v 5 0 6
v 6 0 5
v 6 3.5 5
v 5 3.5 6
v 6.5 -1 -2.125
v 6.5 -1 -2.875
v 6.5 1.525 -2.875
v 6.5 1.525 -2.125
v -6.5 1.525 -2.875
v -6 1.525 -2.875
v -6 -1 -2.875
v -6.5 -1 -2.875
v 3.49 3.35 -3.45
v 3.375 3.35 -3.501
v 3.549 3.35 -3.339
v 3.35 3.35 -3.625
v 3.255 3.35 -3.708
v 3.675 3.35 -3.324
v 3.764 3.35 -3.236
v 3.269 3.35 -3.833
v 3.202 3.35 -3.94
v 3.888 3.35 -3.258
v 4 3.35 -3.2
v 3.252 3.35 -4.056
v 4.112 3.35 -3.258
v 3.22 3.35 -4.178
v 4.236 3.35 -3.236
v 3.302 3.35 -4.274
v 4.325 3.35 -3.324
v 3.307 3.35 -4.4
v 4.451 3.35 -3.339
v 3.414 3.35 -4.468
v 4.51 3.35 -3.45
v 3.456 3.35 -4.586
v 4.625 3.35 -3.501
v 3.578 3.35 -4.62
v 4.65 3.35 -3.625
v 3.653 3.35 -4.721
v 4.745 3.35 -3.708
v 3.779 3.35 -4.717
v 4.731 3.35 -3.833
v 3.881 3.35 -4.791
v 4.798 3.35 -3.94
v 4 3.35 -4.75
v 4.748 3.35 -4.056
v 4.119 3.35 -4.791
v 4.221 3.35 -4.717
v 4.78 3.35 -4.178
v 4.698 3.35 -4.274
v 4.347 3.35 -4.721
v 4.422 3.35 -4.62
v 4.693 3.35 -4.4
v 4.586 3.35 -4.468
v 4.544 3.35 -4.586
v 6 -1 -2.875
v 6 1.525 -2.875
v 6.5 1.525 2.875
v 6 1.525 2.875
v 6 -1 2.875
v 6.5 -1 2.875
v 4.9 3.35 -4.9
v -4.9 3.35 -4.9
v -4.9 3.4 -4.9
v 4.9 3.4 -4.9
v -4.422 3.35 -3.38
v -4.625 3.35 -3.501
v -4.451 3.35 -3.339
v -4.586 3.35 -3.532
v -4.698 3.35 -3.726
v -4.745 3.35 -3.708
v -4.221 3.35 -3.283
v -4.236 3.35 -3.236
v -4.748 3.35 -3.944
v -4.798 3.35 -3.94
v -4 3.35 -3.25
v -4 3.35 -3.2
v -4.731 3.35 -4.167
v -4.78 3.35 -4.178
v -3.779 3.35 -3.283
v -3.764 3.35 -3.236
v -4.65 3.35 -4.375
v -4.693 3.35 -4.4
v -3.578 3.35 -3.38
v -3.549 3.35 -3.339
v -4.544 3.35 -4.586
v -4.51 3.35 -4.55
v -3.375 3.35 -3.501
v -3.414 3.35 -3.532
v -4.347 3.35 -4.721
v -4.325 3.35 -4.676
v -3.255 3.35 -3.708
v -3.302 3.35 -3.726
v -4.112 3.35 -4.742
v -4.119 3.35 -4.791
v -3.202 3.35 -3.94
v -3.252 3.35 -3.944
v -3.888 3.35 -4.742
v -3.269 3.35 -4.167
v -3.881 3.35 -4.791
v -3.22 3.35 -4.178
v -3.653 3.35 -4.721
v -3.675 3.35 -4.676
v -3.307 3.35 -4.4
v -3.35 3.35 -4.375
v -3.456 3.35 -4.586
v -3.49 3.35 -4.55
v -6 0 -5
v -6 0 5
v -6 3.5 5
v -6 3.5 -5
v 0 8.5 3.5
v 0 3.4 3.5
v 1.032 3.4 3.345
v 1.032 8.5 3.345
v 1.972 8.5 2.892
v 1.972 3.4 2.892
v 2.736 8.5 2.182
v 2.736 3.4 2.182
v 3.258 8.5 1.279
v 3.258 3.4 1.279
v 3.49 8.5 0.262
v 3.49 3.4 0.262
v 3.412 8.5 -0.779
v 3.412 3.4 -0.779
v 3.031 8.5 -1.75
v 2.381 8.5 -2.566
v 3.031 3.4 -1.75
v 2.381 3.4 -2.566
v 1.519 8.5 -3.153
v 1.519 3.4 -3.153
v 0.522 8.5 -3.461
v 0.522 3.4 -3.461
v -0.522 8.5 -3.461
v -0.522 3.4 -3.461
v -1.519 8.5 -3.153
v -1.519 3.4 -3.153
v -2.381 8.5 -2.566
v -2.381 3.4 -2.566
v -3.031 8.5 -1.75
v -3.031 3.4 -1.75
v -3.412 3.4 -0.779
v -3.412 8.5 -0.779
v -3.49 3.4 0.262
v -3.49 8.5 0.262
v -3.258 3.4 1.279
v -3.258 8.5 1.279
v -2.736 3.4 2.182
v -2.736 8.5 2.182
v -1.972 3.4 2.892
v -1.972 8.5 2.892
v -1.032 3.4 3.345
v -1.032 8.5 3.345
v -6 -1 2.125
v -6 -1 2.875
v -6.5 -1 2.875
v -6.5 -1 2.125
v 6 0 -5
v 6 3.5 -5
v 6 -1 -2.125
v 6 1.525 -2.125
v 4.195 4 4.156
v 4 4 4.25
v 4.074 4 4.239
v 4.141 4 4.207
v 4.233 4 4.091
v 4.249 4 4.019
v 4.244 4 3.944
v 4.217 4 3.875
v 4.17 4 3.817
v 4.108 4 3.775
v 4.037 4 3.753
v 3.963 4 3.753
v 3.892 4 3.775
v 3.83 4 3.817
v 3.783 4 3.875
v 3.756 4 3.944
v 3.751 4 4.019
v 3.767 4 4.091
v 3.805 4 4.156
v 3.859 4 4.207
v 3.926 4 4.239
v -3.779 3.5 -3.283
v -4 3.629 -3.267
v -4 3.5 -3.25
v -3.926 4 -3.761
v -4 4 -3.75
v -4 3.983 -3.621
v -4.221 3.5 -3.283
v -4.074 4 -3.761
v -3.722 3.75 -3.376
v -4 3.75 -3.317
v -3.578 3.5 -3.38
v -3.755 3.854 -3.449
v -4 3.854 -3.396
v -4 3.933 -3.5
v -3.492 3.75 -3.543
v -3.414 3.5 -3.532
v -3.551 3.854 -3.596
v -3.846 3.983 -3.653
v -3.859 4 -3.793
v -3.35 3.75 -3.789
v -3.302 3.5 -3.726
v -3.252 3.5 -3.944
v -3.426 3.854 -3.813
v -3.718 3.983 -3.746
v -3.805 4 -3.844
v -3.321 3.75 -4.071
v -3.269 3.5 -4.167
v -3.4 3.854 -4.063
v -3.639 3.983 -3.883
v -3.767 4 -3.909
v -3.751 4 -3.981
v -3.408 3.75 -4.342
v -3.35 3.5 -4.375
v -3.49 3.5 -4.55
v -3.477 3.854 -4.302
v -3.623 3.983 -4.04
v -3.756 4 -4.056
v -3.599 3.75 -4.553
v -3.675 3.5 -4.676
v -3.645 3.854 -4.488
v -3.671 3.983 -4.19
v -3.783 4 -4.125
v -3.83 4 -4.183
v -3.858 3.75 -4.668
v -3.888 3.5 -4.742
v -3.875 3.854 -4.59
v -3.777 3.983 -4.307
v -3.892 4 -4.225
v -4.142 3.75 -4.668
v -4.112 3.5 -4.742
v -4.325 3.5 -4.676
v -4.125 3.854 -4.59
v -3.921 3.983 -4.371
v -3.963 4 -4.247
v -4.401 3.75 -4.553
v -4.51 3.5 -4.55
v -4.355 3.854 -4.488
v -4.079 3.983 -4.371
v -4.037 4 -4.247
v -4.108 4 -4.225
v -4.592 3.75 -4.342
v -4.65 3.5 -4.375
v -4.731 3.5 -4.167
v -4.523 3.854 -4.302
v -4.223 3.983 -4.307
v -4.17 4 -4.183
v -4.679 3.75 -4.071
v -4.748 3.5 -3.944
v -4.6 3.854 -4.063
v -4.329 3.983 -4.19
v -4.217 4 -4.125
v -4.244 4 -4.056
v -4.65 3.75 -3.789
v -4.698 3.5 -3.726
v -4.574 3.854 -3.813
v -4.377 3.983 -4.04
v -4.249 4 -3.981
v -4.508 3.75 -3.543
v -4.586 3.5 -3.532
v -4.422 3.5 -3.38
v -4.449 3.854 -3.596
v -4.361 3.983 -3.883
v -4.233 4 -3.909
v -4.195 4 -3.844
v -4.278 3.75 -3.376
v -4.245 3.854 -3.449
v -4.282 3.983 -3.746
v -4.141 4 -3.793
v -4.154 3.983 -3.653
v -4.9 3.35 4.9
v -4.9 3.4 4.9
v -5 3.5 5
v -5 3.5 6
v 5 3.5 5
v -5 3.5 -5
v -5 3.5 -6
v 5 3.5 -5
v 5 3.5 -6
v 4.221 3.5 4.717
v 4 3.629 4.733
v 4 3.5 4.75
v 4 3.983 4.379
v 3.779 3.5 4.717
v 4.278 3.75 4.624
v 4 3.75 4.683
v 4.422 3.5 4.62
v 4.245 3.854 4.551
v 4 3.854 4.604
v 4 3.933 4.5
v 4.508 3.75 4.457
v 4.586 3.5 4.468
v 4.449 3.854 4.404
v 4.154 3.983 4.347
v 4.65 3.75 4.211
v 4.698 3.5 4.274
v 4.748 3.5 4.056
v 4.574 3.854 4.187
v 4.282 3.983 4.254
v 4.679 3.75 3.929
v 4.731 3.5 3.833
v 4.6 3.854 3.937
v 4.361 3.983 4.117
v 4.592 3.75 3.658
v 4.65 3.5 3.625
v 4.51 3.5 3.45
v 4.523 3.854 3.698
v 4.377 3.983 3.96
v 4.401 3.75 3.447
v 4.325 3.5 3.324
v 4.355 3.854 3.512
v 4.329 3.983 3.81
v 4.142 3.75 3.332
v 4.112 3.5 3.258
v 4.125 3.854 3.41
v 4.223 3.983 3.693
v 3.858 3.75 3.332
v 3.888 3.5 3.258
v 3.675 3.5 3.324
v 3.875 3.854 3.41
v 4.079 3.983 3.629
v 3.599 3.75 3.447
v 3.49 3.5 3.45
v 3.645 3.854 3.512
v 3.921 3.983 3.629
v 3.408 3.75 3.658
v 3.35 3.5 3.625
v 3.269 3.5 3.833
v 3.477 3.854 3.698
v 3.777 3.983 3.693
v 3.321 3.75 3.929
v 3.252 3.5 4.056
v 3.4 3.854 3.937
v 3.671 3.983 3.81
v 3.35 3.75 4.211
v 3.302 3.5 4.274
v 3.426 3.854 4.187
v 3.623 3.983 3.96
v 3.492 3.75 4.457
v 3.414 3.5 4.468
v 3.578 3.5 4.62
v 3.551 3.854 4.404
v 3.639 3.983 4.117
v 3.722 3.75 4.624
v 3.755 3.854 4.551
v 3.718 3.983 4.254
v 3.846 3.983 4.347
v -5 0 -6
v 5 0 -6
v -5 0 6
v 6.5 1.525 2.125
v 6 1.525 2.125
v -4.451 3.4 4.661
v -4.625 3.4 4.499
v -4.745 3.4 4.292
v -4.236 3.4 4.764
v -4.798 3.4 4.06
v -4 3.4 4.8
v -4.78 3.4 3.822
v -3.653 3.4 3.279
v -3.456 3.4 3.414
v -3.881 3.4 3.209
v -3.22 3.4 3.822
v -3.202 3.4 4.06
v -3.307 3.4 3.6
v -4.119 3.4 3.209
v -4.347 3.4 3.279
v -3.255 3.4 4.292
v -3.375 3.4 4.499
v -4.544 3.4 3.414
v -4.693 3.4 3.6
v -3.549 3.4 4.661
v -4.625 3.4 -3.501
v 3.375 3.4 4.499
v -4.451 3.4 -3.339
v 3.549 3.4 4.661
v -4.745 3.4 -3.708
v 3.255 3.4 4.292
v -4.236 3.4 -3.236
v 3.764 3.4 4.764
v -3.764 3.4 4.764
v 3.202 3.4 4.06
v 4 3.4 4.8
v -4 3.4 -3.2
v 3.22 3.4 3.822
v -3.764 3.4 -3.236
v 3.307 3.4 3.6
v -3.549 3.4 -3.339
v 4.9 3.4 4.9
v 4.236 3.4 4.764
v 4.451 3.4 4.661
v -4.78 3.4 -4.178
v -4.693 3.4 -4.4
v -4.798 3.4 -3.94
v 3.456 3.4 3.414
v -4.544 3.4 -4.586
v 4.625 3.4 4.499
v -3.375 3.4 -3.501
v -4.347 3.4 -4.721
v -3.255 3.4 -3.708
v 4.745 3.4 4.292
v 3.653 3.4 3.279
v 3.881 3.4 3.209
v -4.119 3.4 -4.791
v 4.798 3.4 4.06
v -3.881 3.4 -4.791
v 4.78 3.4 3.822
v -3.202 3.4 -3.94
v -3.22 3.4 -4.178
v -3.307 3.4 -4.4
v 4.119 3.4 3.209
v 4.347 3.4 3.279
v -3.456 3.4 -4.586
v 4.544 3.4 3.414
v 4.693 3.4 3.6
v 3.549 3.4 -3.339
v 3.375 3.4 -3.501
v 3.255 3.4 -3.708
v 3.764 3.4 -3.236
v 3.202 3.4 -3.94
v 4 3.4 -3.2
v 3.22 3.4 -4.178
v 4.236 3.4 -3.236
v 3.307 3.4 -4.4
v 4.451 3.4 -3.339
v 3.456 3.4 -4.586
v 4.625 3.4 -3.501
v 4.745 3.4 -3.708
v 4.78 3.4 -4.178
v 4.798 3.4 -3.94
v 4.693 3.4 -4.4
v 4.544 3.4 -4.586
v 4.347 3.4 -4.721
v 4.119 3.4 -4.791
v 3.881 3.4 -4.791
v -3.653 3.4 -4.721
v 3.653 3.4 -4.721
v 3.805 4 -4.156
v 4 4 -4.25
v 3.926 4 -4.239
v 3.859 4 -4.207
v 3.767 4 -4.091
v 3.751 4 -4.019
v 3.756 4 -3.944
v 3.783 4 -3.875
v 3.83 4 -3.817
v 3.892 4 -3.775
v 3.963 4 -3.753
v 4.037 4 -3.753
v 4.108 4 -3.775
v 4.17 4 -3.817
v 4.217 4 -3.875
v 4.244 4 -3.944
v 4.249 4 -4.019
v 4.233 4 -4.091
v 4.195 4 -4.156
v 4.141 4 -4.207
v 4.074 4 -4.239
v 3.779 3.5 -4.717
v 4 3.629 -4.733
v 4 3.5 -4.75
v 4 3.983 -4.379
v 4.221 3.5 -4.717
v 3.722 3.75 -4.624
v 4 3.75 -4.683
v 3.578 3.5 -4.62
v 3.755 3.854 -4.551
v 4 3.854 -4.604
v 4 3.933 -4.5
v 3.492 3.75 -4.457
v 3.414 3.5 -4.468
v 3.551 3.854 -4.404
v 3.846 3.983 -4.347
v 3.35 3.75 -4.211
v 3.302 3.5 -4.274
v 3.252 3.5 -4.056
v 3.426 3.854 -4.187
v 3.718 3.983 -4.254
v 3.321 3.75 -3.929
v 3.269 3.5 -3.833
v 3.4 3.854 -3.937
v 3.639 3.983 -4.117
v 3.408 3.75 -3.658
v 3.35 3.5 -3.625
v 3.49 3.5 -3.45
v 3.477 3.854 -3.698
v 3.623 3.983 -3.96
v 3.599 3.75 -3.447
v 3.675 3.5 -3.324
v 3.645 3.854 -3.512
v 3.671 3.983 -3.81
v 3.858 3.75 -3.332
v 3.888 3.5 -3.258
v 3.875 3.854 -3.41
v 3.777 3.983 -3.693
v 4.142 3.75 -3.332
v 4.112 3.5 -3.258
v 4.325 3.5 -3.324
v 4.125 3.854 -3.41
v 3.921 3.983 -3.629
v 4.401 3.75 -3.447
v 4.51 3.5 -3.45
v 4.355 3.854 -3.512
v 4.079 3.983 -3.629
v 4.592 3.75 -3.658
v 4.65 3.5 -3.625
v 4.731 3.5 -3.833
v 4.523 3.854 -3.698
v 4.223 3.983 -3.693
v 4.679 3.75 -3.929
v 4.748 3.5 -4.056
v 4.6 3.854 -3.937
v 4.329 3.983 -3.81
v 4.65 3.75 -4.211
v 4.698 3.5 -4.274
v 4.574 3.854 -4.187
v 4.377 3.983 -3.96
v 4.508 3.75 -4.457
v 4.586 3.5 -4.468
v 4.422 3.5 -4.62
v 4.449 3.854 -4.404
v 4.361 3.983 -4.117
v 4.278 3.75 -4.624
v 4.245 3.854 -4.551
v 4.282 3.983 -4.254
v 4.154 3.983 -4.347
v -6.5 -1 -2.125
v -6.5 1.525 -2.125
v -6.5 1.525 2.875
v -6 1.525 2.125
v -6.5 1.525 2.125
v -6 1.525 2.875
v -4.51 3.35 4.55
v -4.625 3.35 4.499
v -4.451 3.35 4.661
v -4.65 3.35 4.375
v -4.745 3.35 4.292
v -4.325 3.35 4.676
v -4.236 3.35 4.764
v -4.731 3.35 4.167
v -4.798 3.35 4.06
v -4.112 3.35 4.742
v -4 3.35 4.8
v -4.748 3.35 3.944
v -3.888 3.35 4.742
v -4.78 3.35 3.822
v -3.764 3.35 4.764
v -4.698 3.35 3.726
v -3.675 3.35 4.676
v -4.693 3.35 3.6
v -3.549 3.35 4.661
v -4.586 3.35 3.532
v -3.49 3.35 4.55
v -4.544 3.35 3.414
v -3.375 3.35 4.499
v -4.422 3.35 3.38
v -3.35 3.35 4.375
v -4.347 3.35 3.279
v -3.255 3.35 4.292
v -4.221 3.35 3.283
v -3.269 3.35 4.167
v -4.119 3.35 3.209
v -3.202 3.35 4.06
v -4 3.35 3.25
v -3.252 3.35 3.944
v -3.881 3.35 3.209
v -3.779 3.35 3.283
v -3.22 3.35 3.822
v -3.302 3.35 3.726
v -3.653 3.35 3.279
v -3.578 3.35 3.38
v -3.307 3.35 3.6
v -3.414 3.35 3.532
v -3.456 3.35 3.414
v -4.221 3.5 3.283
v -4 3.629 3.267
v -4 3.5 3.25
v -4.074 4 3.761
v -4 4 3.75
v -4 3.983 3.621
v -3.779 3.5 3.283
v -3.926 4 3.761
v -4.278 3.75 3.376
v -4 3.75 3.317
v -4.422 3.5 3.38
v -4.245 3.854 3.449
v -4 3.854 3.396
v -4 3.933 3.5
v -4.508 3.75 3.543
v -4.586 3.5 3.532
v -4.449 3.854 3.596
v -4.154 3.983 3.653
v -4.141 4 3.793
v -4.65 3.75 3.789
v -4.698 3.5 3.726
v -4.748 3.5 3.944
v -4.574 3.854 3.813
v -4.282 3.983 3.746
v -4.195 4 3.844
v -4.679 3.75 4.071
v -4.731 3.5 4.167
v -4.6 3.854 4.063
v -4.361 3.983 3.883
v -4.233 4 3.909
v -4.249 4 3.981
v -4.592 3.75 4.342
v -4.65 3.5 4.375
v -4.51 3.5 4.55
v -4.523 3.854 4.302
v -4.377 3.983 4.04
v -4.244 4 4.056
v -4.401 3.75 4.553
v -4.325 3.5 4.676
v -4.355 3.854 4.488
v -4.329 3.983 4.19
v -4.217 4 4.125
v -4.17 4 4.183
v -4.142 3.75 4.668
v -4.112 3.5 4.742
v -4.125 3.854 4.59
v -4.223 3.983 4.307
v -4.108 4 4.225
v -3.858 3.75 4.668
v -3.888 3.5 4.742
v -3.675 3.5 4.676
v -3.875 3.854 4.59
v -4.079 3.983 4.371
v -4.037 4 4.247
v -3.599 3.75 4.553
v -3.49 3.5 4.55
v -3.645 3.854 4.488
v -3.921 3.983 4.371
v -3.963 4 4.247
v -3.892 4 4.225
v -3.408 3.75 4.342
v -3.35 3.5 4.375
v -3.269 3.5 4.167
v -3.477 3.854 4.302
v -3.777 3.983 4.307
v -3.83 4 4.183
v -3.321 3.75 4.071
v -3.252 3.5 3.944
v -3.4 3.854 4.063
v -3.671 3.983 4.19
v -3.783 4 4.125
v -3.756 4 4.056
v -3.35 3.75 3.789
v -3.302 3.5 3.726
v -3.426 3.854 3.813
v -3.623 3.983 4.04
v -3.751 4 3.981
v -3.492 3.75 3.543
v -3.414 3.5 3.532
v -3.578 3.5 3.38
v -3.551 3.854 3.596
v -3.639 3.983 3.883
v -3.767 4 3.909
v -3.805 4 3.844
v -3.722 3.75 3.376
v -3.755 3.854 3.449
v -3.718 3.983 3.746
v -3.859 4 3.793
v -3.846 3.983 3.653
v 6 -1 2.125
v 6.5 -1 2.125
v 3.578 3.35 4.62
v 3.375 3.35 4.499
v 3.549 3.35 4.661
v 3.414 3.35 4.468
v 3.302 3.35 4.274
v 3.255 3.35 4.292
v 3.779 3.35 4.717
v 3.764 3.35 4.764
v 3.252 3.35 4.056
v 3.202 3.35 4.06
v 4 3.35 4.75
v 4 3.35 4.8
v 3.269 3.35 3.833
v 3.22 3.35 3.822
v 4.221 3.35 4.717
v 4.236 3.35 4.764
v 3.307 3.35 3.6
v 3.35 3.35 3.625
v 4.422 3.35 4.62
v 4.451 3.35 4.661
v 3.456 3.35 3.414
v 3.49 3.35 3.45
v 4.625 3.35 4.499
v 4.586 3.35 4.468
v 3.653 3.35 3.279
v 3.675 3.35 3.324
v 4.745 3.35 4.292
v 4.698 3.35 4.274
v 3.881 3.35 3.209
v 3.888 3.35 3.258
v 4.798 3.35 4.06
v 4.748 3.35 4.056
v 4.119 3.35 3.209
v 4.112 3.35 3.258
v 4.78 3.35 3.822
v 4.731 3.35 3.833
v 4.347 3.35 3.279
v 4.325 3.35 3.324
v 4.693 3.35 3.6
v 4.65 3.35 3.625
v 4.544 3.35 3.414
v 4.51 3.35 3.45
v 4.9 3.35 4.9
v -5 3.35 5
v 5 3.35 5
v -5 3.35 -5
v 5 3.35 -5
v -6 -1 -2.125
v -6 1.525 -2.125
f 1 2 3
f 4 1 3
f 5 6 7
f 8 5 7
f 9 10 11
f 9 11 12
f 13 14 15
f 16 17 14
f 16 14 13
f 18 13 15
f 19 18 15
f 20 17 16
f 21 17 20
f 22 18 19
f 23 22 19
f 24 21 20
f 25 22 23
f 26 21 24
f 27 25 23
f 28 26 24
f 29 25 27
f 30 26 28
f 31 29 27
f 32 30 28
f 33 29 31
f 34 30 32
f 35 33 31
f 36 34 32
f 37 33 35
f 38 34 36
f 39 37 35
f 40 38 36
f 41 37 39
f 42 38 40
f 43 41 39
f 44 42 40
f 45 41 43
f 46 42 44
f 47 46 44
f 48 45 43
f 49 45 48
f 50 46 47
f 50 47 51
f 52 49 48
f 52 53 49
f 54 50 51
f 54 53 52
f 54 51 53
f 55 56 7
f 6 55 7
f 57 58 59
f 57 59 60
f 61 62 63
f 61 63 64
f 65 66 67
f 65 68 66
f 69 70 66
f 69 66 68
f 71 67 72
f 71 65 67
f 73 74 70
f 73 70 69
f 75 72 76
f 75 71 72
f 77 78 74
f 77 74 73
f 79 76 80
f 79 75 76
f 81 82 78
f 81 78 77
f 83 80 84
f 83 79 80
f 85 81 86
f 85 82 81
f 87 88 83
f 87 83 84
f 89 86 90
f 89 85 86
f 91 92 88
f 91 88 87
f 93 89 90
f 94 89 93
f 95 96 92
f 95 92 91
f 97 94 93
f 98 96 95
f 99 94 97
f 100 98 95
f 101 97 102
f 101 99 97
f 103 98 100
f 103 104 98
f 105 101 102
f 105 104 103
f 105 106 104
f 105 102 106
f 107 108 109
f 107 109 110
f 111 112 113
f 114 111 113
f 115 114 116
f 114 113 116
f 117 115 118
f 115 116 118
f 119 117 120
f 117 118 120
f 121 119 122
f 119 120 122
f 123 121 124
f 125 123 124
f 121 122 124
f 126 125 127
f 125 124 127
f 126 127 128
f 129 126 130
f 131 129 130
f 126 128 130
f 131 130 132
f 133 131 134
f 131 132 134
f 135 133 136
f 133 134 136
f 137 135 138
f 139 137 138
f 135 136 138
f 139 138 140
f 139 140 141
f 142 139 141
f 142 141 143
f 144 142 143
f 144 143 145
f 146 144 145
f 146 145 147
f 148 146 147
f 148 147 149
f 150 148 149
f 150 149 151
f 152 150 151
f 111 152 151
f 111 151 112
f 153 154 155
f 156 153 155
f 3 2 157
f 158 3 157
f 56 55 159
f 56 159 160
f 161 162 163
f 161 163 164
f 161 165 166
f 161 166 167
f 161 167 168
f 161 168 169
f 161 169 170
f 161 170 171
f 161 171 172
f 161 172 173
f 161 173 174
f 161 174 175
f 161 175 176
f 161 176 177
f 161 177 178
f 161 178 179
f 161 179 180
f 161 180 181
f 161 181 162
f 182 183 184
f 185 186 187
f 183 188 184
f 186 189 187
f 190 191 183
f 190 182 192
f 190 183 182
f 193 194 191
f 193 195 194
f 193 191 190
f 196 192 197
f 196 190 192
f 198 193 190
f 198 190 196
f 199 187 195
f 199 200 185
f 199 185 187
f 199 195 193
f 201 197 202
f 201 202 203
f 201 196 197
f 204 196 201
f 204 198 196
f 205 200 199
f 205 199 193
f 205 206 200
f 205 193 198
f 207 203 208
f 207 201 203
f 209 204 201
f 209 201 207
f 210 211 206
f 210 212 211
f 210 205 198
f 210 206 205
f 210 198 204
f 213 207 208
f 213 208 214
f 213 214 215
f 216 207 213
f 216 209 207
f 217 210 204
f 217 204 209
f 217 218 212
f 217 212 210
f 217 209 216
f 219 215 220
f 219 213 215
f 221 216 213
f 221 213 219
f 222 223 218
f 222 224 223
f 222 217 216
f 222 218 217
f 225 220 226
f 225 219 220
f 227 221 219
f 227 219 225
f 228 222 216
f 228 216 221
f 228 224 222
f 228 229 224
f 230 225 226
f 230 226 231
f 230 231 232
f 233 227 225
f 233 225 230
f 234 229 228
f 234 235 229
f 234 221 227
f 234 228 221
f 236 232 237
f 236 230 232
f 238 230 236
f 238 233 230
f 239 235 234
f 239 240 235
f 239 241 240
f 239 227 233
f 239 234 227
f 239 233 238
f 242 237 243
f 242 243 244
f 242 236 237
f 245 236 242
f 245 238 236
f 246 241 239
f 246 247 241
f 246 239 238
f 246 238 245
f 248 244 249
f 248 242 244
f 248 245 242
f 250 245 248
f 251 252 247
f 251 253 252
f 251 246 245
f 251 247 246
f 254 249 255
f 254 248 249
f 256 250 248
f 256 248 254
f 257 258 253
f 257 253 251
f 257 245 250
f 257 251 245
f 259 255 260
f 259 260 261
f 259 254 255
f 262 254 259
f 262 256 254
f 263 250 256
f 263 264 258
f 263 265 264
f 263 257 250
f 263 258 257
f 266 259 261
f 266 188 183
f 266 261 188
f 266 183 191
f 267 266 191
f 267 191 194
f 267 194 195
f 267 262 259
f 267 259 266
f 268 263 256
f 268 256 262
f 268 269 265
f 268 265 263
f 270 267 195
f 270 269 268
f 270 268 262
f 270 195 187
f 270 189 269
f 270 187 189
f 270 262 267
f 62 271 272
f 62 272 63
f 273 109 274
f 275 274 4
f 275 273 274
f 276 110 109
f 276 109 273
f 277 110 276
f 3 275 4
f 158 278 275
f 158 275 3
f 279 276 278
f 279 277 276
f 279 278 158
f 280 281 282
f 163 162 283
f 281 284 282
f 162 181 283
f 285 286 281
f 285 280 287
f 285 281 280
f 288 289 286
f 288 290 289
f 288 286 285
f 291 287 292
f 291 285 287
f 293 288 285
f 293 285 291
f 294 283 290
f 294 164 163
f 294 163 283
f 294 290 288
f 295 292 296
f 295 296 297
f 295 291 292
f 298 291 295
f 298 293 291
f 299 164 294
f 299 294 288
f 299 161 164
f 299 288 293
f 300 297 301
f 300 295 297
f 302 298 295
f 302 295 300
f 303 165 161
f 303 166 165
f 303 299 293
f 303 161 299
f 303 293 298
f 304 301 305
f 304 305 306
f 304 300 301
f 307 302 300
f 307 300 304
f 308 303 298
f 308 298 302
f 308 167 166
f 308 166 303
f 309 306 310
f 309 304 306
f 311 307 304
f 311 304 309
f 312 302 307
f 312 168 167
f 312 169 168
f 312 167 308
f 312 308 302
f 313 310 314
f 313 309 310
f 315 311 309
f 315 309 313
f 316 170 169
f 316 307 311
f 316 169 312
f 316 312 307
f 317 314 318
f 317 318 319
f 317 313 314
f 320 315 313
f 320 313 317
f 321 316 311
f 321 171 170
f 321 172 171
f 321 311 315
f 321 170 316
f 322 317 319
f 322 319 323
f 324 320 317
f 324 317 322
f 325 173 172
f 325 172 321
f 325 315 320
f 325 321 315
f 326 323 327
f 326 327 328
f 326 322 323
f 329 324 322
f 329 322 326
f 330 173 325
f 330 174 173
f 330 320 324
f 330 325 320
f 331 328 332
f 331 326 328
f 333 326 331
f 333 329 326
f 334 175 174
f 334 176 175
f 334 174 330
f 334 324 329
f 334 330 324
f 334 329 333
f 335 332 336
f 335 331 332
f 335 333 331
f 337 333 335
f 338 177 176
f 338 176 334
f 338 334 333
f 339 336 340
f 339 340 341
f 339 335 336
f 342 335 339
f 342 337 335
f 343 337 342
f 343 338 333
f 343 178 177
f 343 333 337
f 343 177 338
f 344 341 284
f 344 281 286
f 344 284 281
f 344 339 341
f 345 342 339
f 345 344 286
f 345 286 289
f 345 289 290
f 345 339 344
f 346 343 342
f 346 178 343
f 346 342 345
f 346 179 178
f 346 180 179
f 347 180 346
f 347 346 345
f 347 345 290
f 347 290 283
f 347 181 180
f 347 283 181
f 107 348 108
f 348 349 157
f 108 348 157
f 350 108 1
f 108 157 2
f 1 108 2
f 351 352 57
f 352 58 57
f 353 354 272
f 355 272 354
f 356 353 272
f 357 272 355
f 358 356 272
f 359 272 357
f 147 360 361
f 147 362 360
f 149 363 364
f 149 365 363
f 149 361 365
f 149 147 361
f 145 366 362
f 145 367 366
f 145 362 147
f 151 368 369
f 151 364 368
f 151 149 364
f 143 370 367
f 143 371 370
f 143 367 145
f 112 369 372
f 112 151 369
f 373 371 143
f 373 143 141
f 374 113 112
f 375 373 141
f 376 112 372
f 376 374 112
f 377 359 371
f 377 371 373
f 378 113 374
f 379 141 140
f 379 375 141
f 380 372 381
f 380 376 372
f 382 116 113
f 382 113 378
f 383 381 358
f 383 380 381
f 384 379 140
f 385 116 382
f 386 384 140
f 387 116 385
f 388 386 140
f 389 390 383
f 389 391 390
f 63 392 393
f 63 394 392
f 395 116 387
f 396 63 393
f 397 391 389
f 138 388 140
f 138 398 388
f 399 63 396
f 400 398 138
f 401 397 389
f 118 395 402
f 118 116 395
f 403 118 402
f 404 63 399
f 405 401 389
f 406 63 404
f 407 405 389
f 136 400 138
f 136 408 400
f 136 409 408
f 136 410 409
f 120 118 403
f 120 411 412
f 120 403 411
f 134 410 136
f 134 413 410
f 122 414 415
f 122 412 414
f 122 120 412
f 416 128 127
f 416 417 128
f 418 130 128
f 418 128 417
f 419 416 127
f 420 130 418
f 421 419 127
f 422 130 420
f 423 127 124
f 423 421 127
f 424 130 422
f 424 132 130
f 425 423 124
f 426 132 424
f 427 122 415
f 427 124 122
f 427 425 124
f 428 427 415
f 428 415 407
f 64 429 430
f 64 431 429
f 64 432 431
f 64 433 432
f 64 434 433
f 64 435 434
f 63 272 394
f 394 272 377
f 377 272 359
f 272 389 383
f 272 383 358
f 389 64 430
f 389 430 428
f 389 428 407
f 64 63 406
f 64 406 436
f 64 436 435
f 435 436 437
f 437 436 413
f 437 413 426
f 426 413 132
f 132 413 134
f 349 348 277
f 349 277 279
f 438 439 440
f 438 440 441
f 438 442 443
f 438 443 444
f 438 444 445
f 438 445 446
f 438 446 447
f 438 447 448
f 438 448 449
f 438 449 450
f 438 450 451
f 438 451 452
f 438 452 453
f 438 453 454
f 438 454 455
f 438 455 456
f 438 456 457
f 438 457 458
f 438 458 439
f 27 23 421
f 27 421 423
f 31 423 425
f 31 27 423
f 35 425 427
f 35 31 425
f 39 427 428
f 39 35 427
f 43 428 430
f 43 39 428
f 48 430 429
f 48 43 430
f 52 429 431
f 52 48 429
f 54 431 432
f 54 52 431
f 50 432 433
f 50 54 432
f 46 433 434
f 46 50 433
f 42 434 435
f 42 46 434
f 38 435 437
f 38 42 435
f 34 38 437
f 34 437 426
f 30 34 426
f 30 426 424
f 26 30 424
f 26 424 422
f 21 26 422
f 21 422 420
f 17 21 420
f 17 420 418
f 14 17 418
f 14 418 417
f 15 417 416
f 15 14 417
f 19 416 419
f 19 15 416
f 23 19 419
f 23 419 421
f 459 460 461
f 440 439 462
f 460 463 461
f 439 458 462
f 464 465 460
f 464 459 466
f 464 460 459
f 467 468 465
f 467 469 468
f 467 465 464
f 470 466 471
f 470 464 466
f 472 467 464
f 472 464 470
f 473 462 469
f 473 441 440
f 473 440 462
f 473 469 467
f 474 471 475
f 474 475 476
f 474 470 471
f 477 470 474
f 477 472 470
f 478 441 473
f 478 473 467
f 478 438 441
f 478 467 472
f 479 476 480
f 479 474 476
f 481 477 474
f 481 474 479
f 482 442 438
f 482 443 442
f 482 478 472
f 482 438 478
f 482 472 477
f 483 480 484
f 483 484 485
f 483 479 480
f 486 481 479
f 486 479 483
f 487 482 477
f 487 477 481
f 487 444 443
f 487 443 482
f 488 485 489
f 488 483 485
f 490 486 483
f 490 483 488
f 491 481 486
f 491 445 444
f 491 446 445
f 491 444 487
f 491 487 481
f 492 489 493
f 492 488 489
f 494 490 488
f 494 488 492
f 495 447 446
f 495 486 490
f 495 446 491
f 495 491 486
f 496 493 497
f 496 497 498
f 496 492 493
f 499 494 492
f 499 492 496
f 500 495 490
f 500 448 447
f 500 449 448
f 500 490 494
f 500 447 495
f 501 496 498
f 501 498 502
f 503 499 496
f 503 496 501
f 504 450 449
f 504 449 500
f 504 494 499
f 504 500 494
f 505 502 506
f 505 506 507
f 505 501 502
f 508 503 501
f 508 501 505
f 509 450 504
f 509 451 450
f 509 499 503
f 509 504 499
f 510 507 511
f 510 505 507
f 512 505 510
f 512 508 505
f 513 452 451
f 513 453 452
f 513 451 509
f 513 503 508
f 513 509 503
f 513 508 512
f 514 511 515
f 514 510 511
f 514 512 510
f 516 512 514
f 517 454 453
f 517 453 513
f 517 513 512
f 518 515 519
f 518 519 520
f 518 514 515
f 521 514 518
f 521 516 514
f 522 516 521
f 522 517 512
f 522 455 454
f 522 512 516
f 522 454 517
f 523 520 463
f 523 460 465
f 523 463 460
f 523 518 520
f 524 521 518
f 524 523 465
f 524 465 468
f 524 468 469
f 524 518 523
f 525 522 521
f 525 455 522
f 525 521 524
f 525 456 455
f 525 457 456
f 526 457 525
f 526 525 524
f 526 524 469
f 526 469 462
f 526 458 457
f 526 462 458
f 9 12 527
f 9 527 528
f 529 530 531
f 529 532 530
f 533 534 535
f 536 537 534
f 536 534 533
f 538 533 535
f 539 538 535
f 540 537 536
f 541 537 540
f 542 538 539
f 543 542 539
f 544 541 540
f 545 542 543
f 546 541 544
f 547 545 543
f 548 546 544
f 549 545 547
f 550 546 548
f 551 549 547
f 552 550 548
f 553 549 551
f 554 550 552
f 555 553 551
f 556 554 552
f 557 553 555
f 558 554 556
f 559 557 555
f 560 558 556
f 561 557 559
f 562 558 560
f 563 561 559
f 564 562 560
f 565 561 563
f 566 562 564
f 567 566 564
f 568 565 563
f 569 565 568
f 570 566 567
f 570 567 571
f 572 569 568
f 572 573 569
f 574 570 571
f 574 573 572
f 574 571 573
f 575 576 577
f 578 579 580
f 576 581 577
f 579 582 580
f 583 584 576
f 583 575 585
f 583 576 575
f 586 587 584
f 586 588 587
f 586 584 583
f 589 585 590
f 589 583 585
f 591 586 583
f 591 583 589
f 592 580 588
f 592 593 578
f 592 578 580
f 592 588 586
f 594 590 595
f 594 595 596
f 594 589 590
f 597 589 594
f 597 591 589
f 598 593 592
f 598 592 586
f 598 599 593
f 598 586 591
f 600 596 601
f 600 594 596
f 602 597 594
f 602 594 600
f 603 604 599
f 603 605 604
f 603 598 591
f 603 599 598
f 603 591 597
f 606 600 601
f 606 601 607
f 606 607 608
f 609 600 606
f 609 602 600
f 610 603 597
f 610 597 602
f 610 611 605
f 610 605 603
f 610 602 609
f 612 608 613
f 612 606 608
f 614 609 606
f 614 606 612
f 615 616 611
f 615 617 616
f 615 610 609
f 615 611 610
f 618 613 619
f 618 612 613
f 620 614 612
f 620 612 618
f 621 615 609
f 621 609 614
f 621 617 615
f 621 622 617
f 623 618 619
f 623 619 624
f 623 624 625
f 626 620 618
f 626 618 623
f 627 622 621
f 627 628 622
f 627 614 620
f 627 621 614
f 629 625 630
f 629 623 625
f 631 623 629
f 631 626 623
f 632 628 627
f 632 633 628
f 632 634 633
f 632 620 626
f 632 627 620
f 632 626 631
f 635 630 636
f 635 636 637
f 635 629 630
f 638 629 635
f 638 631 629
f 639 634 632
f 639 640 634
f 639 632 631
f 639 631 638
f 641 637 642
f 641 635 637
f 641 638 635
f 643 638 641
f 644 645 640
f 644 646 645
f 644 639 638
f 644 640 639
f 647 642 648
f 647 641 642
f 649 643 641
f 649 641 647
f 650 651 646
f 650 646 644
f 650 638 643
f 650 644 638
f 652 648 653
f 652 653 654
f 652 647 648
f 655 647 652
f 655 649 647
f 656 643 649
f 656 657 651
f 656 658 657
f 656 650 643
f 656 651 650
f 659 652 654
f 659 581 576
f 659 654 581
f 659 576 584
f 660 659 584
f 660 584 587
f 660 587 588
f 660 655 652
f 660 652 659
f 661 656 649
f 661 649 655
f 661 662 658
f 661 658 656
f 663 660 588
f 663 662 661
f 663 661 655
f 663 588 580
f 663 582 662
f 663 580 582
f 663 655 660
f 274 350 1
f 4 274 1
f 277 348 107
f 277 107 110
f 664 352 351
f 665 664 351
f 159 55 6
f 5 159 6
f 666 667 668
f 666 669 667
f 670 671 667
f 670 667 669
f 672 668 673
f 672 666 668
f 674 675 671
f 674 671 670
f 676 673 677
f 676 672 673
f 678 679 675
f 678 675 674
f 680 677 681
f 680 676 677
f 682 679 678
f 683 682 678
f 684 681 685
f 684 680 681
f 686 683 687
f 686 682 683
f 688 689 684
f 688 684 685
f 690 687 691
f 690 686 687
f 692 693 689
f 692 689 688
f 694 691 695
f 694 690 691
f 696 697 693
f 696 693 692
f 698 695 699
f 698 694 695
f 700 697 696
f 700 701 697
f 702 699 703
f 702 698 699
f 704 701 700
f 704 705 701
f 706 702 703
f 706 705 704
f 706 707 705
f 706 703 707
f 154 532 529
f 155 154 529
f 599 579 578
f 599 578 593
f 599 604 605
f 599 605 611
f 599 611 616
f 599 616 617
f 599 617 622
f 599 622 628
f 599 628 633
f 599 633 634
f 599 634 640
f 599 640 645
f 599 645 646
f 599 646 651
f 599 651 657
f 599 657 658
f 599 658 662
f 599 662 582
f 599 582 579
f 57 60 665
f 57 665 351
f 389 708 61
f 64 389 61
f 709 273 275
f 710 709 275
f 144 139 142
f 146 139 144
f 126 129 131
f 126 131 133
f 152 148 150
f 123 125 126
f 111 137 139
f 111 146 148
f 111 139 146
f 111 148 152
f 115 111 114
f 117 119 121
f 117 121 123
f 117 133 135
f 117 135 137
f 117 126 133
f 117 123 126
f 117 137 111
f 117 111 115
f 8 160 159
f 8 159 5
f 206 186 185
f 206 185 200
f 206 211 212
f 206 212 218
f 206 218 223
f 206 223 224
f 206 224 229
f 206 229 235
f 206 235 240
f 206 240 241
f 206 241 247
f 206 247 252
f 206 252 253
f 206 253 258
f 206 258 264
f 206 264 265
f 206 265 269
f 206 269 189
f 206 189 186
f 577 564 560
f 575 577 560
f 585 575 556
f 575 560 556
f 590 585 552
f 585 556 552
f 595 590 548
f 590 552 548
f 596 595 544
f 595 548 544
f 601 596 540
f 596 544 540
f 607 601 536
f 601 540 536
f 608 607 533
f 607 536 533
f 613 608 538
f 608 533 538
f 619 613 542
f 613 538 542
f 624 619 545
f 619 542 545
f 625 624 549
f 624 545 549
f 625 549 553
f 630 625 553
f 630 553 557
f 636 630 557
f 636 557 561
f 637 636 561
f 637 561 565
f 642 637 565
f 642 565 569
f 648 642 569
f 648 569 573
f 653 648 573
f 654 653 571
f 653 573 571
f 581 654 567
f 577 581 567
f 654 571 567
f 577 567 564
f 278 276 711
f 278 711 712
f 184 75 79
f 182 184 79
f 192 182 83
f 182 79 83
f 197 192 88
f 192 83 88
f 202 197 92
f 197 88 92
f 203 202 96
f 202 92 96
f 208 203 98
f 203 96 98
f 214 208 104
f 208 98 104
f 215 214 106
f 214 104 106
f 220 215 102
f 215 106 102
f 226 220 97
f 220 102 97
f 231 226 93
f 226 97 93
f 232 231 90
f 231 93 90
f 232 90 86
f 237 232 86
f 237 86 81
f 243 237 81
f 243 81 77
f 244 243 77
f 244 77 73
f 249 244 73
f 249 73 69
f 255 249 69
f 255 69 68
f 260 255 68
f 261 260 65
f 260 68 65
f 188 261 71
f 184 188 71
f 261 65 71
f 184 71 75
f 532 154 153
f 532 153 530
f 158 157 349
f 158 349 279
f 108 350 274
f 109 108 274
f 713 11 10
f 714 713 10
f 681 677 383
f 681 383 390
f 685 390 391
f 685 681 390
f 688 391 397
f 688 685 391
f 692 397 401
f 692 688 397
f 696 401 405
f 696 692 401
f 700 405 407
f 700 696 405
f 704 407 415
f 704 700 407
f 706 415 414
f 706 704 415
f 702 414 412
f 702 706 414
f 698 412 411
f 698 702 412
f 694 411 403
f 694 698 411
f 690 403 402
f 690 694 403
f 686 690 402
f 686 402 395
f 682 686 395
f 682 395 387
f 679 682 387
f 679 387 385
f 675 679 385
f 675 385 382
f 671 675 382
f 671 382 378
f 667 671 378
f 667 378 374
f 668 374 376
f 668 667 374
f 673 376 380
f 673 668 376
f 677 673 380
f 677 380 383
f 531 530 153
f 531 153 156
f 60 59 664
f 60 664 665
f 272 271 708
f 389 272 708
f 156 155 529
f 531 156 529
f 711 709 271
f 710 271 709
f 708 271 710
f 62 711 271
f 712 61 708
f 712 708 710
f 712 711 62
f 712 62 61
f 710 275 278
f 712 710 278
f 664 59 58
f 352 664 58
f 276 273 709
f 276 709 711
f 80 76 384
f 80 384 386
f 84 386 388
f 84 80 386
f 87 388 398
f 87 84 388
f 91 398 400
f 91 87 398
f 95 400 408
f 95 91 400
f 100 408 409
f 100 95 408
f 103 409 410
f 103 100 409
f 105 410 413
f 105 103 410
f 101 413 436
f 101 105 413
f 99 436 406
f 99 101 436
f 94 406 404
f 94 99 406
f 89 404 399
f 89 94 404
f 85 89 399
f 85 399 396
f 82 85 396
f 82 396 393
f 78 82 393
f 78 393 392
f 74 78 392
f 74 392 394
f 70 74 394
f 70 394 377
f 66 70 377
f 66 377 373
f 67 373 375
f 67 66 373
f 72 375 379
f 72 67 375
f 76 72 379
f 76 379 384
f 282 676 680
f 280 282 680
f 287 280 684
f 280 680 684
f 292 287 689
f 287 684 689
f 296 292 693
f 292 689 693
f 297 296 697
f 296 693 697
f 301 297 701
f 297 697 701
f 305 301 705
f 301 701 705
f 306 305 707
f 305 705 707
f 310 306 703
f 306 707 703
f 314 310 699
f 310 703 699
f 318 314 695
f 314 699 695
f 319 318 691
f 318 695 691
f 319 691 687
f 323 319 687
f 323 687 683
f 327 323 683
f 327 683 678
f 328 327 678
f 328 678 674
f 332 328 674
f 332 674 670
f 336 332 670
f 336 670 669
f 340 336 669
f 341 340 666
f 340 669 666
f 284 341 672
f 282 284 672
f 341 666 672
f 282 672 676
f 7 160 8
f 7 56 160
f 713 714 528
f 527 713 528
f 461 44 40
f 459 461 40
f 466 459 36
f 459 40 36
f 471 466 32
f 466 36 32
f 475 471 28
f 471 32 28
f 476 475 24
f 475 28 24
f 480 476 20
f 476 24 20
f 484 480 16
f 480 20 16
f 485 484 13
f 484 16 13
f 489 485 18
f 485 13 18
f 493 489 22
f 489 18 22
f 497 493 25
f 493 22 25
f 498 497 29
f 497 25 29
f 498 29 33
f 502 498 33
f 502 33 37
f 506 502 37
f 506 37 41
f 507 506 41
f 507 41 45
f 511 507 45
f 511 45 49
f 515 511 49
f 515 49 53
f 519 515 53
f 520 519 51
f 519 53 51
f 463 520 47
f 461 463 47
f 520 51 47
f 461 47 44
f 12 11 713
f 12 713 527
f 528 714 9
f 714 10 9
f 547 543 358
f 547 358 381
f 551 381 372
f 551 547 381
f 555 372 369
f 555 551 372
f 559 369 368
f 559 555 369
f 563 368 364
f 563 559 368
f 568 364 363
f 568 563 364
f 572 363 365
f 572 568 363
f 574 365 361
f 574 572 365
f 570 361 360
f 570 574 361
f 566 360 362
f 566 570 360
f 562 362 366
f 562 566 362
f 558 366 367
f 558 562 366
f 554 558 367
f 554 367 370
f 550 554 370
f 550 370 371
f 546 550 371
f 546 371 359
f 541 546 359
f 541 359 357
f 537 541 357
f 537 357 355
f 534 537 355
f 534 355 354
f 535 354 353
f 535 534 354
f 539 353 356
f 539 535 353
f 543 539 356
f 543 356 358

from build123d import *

# Parameters (mm, degrees)
SKETCH1_W                = 12
SKETCH1_H                = 12
BOSS_EXTRUDE1_DEPTH      = 3.5
SKETCH15_W               = 10
SKETCH15_H               = 10
CUT_EXTRUDE1_DEPTH       = 0.15
BOSS_EXTRUDE2_DEPTH      = 5
BOSS_EXTRUDE2_DEPTH_BACK = 3.5
SKETCH2_R                = 3.5
CHAMFER1_SIZE            = 1
SKETCH4_W                = 0.5
SKETCH4_H                = 2.525109238
BASE_FLANGE1_DEPTH       = 0.375
SKETCH16_R               = 0.75
BOSS_EXTRUDE3_DEPTH      = 0.65
FILLET1_R                = 0.5
SKETCH17_W               = 9.8
SKETCH17_H               = 9.8
SKETCH17_R               = 0.8
BOSS_EXTRUDE4_DEPTH      = 0.05


# Sheet-metal steps are written as plain solids
with BuildPart() as part:
    # Sketch1 → Boss-Extrude1 (new body)
    with BuildSketch(Plane(origin=(0, 0, 0), x_dir=(1, 0, 0), z_dir=(0, 1, 0))):
        Rectangle(SKETCH1_W, SKETCH1_H)
    extrude(amount=BOSS_EXTRUDE1_DEPTH)

    # Sketch15 → Cut-Extrude1 (cut)
    with BuildSketch(Plane(origin=(0, 3.5, 0), x_dir=(1, 0, 0), z_dir=(0, 1, 0))):
        Rectangle(SKETCH15_W, SKETCH15_H)
    extrude(amount=-CUT_EXTRUDE1_DEPTH, mode=Mode.SUBTRACT)

    # Sketch2 → Boss-Extrude2 (add, two sides: drawn at the far end of the back side and taken through both)
    with BuildSketch(Plane(origin=(0, 3.5, 0), x_dir=(1, 0, 0), z_dir=(0, 1, 0)).offset(-BOSS_EXTRUDE2_DEPTH_BACK)):
        with Locations(Location((0, 0, 0), (0, 0, 270))):
            Circle(SKETCH2_R)
    extrude(amount=BOSS_EXTRUDE2_DEPTH + BOSS_EXTRUDE2_DEPTH_BACK)

    # Chamfer1
    chamfer1_edges = [part.edges().sort_by_distance(p)[0] for p in [
        (6, 1.75, 6),
        (-6, 1.75, 6),
        (-6, 1.75, -6),
        (6, 1.75, -6),
    ]]
    chamfer(chamfer1_edges, length=CHAMFER1_SIZE)

    # Sketch16 → Boss-Extrude3 (add)
    with BuildSketch(Plane(origin=(0, 3.35, 0), x_dir=(1, 0, 0), z_dir=(0, 1, 0))):
        with Locations(Location((-4, 4, 0), (0, 0, 270))):
            Circle(SKETCH16_R)
        with Locations(Location((4, 4, 0), (0, 0, 90))):
            Circle(SKETCH16_R)
        with Locations(Location((4, -4, 0), (0, 0, 270))):
            Circle(SKETCH16_R)
        with Locations(Location((-4, -4, 0), (0, 0, 90))):
            Circle(SKETCH16_R)
    extrude(amount=BOSS_EXTRUDE3_DEPTH)

    # Fillet1
    fillet1_edges = [part.edges().sort_by_distance(p)[0] for p in [
        (-4, 4, -4.75),
        (4, 4, -3.25),
        (4, 4, 3.25),
        (-4, 4, 4.75),
    ]]
    fillet(fillet1_edges, radius=FILLET1_R)

    # Sketch17 → Boss-Extrude4 (add)
    with BuildSketch(Plane(origin=(0, 3.35, 0), x_dir=(1, 0, 0), z_dir=(0, 1, 0))):
        Rectangle(SKETCH17_W, SKETCH17_H)
        with Locations(Location((-4, 4, 0), (0, 0, 270))):
            Circle(SKETCH17_R, mode=Mode.SUBTRACT)
        with Locations(Location((4, 4, 0), (0, 0, 270))):
            Circle(SKETCH17_R, mode=Mode.SUBTRACT)
        with Locations(Location((-4, -4, 0), (0, 0, 270))):
            Circle(SKETCH17_R, mode=Mode.SUBTRACT)
        with Locations(Location((4, -4, 0), (0, 0, 270))):
            Circle(SKETCH17_R, mode=Mode.SUBTRACT)
    extrude(amount=BOSS_EXTRUDE4_DEPTH)


with BuildPart() as body_2:
    # Sketch4 → Base-Flange1 (new, symmetric)
    with BuildSketch(Plane.XY.offset(2.5)):
        with Locations((6.25, 0.262554619)):
            Rectangle(SKETCH4_W, SKETCH4_H)
    extrude(amount=BASE_FLANGE1_DEPTH, both=True)


with BuildPart() as body_3:
    # Mirror1: mirrored copy
    add(body_2.part.mirror(Plane.XY))


with BuildPart() as body_4:
    # Mirror2: mirrored copy
    add(body_2.part.mirror(Plane(origin=(0, 0, 0), x_dir=(0, 0, 1), z_dir=(1, 0, 0))))


with BuildPart() as body_5:
    # Mirror2 2: mirrored copy
    add(body_3.part.mirror(Plane(origin=(0, 0, 0), x_dir=(0, 0, 1), z_dir=(1, 0, 0))))


solid = Compound([part.part, body_2.part, body_3.part, body_4.part, body_5.part])
